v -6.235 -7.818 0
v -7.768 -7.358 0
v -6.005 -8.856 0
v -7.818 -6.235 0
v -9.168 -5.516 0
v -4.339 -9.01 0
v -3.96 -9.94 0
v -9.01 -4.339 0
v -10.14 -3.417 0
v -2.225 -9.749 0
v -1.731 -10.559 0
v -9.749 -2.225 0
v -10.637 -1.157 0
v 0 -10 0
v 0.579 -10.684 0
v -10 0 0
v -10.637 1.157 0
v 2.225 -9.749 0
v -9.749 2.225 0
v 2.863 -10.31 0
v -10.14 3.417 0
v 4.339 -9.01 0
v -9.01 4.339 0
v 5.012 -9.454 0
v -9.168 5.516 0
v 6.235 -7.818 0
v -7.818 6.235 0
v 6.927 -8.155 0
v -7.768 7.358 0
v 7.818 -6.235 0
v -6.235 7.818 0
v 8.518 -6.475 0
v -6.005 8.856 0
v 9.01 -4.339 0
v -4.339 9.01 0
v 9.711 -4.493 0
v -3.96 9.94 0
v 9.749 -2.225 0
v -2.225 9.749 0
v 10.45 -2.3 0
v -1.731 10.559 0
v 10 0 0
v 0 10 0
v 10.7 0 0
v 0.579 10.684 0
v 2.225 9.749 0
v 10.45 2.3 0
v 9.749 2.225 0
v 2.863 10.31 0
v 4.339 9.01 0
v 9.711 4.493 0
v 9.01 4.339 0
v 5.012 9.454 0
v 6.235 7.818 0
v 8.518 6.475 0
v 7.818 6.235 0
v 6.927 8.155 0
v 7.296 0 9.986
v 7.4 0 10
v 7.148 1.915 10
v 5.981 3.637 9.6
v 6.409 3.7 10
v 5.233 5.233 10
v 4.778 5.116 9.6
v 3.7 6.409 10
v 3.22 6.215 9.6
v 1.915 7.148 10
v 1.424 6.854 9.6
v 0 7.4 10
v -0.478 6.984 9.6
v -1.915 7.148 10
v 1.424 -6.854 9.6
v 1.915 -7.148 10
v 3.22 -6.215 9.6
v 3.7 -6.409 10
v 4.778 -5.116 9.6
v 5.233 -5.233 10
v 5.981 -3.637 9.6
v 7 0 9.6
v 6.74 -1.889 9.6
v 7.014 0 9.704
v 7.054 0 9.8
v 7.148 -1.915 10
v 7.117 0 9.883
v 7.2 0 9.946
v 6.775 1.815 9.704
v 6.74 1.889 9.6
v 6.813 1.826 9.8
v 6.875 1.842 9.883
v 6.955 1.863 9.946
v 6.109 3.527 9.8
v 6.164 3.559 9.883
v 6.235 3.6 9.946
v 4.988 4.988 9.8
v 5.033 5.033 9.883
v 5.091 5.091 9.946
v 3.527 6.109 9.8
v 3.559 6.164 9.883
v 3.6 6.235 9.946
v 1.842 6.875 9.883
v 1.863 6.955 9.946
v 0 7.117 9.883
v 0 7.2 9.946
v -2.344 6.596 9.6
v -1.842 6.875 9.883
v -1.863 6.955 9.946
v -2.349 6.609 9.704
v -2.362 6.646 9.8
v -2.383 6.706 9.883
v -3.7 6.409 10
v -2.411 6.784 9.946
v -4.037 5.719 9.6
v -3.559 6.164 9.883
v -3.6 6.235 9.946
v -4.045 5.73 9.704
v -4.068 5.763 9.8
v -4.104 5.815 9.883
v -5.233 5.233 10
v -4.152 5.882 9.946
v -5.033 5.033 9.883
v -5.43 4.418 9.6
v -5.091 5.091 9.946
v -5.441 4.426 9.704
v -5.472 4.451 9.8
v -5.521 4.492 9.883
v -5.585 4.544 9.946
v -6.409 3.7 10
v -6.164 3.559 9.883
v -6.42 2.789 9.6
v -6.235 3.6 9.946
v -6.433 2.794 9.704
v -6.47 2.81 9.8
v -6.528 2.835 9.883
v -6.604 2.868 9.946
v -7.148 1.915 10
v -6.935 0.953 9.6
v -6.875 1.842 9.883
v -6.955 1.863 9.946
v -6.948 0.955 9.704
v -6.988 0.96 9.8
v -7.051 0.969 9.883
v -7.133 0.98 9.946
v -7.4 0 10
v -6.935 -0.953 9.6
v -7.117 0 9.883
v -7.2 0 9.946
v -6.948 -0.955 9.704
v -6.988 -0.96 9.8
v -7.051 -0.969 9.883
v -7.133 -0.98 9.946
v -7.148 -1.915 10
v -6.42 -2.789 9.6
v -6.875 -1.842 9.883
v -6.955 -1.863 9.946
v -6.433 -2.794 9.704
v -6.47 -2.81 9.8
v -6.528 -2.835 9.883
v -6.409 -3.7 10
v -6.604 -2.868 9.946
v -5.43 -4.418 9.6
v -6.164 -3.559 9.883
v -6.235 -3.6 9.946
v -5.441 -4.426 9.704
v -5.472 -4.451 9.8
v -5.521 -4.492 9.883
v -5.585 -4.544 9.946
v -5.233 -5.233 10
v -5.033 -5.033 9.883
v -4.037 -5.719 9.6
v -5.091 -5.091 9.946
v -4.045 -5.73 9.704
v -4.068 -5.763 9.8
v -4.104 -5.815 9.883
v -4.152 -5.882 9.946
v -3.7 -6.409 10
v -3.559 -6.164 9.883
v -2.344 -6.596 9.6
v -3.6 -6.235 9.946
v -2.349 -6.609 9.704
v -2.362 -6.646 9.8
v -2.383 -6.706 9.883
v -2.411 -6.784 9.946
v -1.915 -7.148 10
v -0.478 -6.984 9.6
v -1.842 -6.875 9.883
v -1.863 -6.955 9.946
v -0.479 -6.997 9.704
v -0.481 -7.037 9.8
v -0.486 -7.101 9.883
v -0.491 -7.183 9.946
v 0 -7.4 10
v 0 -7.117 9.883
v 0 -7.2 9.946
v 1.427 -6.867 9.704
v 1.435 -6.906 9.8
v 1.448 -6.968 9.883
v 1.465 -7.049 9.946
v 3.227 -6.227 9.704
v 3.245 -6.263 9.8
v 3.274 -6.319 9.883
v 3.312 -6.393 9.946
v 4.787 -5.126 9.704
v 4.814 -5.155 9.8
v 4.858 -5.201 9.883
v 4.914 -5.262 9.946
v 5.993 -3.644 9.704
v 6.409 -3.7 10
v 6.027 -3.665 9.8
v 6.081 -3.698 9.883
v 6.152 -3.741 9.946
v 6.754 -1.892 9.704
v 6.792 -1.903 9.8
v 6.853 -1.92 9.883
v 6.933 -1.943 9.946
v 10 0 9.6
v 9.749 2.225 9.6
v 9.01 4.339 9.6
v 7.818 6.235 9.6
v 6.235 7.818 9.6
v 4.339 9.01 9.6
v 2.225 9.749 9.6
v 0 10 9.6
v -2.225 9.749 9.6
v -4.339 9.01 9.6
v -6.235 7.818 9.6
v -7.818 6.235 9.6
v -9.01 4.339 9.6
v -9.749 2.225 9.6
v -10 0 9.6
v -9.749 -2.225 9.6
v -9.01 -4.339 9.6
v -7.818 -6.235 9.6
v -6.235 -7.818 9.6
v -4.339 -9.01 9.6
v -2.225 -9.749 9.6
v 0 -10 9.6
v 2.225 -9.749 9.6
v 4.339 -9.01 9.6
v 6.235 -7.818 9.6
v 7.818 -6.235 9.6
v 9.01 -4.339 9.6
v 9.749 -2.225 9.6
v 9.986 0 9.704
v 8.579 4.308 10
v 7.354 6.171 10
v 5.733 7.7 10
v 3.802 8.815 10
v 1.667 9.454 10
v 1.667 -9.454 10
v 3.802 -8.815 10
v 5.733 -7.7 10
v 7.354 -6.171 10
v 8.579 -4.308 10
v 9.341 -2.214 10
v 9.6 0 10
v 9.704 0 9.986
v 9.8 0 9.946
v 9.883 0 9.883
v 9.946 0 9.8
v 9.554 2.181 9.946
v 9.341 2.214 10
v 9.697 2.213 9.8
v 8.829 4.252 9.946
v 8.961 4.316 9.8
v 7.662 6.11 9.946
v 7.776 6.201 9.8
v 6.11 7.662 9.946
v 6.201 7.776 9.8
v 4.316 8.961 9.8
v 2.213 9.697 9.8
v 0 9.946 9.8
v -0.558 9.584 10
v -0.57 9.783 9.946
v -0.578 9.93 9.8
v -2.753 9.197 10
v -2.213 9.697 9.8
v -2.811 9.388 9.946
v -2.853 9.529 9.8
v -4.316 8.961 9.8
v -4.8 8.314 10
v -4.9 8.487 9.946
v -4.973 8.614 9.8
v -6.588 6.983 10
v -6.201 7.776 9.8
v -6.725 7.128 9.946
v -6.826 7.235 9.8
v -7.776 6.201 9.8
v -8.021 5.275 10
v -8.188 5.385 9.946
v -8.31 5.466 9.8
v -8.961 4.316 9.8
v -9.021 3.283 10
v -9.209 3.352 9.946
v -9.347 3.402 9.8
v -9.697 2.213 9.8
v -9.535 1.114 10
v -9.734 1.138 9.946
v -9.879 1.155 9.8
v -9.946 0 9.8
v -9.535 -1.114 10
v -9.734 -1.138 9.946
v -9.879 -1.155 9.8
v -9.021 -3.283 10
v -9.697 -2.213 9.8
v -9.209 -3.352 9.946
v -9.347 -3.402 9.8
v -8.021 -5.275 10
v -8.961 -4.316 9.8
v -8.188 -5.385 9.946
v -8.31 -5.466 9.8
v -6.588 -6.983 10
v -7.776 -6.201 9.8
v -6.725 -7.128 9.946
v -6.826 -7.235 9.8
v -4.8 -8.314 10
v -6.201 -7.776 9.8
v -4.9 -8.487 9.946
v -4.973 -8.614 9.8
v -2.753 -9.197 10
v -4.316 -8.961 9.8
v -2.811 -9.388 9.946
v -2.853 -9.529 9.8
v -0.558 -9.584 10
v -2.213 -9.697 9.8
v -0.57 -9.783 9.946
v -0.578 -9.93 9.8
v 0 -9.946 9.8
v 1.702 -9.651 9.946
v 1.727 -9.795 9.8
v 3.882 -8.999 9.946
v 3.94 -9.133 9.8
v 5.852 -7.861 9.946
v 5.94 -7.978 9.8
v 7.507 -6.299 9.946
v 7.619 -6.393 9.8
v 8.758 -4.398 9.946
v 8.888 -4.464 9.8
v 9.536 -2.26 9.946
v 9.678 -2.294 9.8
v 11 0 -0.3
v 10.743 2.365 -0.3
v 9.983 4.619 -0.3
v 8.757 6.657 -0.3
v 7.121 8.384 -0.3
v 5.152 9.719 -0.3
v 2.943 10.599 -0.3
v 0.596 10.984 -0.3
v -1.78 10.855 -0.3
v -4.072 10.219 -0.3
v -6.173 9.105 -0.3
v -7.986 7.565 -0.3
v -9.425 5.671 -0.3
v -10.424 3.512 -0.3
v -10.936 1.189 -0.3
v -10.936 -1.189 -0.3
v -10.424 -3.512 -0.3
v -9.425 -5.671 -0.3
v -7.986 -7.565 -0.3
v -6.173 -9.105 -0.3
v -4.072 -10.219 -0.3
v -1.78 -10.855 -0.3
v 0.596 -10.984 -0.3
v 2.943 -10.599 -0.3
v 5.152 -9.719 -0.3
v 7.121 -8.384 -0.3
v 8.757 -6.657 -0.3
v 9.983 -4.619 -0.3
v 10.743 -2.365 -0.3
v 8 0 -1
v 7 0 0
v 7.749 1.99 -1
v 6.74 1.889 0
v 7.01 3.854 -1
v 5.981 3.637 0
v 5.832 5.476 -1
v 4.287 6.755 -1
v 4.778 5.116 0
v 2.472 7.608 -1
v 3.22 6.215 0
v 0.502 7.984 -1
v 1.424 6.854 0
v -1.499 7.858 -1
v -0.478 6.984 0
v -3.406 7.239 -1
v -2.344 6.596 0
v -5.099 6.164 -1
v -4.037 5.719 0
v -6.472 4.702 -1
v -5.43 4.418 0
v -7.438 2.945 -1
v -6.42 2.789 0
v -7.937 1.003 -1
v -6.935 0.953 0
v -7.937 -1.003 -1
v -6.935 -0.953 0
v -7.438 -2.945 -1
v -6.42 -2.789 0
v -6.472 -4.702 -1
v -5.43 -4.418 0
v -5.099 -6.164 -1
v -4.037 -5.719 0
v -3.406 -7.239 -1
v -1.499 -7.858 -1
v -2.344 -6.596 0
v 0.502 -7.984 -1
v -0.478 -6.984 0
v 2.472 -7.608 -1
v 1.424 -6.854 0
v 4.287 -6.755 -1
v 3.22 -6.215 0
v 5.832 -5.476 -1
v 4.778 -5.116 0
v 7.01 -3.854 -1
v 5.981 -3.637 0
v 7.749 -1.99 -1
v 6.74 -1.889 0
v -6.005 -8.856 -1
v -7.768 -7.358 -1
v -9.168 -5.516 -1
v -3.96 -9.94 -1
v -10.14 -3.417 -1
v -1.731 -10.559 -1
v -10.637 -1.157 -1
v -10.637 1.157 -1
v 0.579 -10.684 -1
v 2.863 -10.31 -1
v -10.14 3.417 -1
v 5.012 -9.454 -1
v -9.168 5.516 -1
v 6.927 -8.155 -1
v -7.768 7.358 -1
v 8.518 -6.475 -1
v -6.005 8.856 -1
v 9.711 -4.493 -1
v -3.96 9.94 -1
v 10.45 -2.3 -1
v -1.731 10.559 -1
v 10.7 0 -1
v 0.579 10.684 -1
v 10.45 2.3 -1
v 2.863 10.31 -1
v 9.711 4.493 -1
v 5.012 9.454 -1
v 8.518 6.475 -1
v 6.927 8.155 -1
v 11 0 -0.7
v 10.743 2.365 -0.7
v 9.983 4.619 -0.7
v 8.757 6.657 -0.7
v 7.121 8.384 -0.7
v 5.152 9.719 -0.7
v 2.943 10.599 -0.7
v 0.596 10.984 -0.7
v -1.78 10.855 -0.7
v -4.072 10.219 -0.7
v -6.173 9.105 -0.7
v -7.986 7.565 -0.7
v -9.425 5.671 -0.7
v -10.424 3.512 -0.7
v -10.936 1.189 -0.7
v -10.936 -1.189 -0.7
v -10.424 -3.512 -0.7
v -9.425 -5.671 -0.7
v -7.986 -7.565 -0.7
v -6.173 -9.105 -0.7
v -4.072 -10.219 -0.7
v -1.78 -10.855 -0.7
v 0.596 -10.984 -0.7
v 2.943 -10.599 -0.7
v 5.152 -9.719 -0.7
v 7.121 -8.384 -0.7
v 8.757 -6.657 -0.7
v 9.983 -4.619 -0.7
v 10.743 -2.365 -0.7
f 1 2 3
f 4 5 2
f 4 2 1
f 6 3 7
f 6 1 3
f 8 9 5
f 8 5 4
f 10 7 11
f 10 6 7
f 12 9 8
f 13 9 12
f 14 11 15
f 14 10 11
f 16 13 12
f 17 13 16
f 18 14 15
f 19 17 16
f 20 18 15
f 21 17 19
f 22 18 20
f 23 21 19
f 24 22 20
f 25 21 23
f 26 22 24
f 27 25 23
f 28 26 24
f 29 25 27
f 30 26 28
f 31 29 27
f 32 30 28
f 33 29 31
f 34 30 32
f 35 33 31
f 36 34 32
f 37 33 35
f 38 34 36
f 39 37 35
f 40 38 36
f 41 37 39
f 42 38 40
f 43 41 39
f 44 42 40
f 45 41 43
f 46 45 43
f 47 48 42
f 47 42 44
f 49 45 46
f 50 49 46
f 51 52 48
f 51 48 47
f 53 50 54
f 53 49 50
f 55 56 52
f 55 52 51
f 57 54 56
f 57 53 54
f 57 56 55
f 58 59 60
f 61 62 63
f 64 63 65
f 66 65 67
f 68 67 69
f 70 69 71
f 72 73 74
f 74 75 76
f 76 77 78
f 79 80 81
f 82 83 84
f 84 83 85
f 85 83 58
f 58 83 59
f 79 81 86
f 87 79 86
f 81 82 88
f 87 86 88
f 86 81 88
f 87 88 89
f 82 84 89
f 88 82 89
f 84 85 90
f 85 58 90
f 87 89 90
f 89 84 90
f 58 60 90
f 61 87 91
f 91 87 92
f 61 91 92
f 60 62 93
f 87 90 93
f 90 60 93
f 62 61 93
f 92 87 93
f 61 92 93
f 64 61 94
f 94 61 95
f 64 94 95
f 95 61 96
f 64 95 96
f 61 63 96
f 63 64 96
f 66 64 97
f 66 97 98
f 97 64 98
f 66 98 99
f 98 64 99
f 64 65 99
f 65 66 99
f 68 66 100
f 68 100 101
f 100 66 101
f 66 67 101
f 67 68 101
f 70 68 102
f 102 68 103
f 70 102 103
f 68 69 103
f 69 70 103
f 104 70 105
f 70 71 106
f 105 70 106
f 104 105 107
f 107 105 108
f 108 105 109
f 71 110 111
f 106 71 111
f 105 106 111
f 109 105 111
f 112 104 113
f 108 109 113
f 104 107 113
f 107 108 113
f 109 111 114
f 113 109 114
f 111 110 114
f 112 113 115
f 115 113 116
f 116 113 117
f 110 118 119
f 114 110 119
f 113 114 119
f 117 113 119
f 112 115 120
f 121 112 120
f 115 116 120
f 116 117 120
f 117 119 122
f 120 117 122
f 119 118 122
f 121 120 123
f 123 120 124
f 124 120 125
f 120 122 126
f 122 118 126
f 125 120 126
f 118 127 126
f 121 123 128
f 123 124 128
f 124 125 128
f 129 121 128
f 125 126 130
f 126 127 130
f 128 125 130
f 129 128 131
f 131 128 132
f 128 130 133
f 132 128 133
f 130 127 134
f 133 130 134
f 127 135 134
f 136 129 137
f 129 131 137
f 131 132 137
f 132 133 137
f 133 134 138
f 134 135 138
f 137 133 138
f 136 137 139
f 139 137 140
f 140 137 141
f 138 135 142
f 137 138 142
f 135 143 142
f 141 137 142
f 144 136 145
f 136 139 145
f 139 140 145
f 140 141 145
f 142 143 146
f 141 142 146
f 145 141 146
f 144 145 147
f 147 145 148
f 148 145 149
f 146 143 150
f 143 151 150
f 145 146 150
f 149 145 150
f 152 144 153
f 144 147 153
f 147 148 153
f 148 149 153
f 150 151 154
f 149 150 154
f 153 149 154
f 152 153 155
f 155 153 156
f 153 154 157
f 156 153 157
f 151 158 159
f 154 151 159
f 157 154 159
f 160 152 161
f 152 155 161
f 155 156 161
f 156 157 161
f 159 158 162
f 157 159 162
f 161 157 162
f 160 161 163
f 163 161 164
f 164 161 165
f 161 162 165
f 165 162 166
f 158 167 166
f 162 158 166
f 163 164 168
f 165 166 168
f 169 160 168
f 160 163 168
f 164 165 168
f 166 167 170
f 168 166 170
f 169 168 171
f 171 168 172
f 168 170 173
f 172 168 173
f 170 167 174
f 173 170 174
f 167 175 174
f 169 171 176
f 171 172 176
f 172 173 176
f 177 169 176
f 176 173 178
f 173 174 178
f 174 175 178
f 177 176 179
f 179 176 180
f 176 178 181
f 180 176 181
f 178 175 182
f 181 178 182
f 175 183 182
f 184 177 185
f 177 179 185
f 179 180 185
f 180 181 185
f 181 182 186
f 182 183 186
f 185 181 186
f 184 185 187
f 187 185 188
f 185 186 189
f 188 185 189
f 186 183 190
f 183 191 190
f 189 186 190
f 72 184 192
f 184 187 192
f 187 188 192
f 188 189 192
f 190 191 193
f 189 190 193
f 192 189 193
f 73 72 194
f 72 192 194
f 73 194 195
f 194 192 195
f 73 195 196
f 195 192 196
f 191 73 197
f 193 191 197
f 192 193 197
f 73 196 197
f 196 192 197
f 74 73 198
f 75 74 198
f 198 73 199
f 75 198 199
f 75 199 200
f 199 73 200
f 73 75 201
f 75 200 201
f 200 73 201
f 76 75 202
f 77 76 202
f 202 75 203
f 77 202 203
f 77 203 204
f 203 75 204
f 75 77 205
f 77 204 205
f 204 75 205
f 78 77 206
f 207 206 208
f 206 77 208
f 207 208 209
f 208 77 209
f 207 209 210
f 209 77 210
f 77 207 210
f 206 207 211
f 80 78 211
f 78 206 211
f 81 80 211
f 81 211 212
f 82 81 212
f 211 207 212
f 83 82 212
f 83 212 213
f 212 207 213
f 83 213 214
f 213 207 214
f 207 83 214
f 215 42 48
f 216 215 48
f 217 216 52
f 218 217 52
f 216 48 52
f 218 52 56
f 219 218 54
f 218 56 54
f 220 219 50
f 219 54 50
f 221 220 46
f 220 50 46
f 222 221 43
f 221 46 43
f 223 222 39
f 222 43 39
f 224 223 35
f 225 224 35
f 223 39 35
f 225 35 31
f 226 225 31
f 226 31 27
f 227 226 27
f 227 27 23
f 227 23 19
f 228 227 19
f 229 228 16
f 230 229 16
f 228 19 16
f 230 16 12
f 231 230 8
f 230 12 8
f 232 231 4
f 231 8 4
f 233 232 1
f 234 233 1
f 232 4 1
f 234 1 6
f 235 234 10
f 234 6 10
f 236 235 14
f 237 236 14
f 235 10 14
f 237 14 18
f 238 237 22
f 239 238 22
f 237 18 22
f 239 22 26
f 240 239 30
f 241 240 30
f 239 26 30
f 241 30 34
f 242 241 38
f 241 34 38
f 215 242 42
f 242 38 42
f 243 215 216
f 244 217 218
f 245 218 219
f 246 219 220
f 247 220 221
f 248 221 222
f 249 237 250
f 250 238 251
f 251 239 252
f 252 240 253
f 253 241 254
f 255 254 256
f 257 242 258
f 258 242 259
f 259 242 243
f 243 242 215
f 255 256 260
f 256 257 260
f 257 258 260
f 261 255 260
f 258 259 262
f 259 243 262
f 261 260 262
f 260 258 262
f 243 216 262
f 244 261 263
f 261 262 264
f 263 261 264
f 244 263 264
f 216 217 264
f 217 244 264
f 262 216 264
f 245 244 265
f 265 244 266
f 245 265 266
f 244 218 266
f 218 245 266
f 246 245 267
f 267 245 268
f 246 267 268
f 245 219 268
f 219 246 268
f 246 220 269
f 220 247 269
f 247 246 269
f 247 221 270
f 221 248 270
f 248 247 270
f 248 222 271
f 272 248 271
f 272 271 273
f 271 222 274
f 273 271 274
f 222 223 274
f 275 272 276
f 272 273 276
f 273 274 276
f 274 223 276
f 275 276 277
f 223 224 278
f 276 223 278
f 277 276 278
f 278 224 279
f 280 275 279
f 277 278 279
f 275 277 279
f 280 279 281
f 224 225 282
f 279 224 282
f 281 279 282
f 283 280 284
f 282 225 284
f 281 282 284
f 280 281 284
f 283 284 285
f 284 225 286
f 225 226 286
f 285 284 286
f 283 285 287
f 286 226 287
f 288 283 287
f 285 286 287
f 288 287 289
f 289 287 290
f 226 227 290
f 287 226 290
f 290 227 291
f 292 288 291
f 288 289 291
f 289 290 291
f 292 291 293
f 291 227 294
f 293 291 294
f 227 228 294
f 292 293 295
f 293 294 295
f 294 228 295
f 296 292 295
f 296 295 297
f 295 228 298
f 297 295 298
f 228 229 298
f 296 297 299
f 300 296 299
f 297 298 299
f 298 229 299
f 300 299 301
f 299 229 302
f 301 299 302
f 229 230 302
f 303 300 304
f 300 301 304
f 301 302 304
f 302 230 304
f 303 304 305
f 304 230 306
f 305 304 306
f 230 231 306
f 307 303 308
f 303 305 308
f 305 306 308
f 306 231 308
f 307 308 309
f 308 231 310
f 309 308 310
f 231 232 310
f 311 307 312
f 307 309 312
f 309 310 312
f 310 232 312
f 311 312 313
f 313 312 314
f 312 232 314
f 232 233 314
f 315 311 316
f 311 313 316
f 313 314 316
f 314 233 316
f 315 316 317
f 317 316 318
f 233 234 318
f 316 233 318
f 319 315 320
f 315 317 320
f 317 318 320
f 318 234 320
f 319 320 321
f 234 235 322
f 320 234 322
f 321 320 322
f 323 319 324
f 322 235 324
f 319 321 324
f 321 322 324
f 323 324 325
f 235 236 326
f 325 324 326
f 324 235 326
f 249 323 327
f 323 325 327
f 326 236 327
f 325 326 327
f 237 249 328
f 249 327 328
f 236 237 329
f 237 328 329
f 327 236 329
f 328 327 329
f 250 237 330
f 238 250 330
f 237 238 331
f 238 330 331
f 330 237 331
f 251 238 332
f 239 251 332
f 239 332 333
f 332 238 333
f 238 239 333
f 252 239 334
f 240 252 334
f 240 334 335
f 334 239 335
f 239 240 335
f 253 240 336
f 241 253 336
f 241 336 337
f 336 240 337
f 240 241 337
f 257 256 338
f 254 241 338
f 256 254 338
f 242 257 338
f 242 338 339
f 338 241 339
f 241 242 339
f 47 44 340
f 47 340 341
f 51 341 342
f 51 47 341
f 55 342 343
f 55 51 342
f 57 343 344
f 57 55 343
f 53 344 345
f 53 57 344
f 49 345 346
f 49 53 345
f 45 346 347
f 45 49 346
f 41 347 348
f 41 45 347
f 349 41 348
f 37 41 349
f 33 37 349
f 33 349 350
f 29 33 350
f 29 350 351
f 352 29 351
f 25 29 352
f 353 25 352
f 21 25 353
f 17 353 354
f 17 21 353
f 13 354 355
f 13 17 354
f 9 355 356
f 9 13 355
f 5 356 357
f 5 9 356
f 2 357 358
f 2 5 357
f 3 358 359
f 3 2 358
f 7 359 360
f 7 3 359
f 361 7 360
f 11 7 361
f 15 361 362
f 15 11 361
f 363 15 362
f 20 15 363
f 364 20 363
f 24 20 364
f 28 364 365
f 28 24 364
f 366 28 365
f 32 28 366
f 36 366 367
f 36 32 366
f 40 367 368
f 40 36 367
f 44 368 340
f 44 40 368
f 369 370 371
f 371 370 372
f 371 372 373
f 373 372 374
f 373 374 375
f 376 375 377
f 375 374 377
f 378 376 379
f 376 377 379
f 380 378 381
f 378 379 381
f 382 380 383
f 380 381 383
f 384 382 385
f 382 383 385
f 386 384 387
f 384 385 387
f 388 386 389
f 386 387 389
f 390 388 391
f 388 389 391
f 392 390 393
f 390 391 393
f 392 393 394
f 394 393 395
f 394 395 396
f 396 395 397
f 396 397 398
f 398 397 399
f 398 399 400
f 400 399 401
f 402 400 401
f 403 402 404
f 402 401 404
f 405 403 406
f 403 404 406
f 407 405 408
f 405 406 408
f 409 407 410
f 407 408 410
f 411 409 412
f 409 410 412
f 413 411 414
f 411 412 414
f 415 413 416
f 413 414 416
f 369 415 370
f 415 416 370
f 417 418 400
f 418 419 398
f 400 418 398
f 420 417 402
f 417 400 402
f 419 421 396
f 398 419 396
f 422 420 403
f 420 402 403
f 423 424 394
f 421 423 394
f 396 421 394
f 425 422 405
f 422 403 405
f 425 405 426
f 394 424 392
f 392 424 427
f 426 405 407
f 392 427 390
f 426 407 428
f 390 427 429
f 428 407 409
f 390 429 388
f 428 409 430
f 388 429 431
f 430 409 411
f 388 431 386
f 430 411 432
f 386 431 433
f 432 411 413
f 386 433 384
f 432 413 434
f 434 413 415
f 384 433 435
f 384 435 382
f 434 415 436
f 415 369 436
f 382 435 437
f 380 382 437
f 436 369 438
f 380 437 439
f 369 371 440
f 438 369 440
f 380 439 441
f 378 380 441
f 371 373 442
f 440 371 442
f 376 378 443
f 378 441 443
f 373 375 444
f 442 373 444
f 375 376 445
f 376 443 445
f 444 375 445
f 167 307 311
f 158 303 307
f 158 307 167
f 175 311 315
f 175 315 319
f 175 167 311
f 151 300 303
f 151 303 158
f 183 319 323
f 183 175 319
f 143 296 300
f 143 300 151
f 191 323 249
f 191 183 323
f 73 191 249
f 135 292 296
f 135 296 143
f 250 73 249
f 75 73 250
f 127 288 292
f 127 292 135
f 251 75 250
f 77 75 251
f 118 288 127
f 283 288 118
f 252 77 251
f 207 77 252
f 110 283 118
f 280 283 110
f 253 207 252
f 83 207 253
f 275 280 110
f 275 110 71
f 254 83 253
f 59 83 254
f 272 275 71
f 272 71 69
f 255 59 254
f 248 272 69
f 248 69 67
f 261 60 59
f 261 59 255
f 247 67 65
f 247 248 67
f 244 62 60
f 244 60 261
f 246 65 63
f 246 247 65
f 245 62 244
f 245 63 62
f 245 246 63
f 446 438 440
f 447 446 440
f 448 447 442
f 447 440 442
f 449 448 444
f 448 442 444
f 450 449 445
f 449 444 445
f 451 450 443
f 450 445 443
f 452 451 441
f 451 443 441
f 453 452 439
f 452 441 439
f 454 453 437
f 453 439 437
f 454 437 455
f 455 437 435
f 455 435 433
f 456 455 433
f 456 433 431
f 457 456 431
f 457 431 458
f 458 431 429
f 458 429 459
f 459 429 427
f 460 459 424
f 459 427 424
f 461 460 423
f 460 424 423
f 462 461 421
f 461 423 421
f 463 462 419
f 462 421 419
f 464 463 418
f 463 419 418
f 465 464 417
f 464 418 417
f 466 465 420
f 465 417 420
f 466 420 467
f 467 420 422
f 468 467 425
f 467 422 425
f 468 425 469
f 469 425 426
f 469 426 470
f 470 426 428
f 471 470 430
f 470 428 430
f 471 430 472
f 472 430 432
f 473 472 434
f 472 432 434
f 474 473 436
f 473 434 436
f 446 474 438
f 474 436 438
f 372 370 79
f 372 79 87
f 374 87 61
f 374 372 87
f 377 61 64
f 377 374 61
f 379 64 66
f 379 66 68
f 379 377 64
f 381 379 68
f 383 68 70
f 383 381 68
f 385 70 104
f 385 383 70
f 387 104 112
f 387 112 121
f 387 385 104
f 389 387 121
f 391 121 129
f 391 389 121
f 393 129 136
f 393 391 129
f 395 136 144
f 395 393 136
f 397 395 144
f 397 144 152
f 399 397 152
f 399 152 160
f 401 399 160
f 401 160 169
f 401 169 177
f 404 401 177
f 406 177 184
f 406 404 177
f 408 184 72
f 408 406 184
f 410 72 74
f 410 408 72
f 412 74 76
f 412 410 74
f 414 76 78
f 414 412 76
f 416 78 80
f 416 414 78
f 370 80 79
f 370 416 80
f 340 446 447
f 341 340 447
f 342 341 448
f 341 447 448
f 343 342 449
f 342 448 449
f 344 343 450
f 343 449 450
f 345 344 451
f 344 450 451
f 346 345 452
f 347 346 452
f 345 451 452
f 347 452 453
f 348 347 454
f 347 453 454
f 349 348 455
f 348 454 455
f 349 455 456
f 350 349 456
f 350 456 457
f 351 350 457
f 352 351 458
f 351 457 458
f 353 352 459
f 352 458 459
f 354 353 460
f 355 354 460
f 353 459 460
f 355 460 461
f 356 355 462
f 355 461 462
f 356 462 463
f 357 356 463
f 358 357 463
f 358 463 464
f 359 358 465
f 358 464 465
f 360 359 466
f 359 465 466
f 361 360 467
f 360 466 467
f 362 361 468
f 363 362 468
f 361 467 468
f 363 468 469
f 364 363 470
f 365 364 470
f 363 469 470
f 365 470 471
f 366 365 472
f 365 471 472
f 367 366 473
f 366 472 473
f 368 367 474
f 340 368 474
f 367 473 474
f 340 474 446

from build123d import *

# Parameters (mm, degrees)
SKETCH2_R           = 10
SKETCH2_R_2         = 7
BOSS_EXTRUDE1_DEPTH = 10
BOSS_EXTRUDE2_START = -1
SKETCH2_3_R         = 11
SKETCH2_3_R_2       = 7
BOSS_EXTRUDE2_DEPTH = 1
CHAMFER1_SIZE       = 0.3
CHAMFER2_SIZE       = 0.3
CHAMFER3_SIZE       = 1
FILLET1_R           = 0.4


with BuildPart() as part:
    # Sketch2 → Boss-Extrude1 (new body)
    with BuildSketch(Plane.XY):
        Circle(SKETCH2_R)
        Circle(SKETCH2_R_2, mode=Mode.SUBTRACT)
    extrude(amount=BOSS_EXTRUDE1_DEPTH)

    # Sketch2<3> → Boss-Extrude2 (add)
    with BuildSketch(Plane.XY.offset(BOSS_EXTRUDE2_START)):
        Circle(SKETCH2_3_R)
        Circle(SKETCH2_3_R_2, mode=Mode.SUBTRACT)
    extrude(amount=BOSS_EXTRUDE2_DEPTH)

    # Chamfer1
    chamfer1_edges = [part.edges().sort_by_distance(p)[0] for p in [
        (-11, 0, 0),
    ]]
    chamfer(chamfer1_edges, length=CHAMFER1_SIZE)

    # Chamfer2
    chamfer2_edges = [part.edges().sort_by_distance(p)[0] for p in [
        (-11, 0, -1),
    ]]
    chamfer(chamfer2_edges, length=CHAMFER2_SIZE)

    # Chamfer3
    chamfer3_edges = [part.edges().sort_by_distance(p)[0] for p in [
        (-7, 0, -1),
    ]]
    chamfer(chamfer3_edges, length=CHAMFER3_SIZE)

    # Fillet1
    fillet1_edges = [part.edges().sort_by_distance(p)[0] for p in [
        (-7, 0, 10),
        (-10, 0, 10),
    ]]
    fillet(fillet1_edges, radius=FILLET1_R)


solid = part.part
